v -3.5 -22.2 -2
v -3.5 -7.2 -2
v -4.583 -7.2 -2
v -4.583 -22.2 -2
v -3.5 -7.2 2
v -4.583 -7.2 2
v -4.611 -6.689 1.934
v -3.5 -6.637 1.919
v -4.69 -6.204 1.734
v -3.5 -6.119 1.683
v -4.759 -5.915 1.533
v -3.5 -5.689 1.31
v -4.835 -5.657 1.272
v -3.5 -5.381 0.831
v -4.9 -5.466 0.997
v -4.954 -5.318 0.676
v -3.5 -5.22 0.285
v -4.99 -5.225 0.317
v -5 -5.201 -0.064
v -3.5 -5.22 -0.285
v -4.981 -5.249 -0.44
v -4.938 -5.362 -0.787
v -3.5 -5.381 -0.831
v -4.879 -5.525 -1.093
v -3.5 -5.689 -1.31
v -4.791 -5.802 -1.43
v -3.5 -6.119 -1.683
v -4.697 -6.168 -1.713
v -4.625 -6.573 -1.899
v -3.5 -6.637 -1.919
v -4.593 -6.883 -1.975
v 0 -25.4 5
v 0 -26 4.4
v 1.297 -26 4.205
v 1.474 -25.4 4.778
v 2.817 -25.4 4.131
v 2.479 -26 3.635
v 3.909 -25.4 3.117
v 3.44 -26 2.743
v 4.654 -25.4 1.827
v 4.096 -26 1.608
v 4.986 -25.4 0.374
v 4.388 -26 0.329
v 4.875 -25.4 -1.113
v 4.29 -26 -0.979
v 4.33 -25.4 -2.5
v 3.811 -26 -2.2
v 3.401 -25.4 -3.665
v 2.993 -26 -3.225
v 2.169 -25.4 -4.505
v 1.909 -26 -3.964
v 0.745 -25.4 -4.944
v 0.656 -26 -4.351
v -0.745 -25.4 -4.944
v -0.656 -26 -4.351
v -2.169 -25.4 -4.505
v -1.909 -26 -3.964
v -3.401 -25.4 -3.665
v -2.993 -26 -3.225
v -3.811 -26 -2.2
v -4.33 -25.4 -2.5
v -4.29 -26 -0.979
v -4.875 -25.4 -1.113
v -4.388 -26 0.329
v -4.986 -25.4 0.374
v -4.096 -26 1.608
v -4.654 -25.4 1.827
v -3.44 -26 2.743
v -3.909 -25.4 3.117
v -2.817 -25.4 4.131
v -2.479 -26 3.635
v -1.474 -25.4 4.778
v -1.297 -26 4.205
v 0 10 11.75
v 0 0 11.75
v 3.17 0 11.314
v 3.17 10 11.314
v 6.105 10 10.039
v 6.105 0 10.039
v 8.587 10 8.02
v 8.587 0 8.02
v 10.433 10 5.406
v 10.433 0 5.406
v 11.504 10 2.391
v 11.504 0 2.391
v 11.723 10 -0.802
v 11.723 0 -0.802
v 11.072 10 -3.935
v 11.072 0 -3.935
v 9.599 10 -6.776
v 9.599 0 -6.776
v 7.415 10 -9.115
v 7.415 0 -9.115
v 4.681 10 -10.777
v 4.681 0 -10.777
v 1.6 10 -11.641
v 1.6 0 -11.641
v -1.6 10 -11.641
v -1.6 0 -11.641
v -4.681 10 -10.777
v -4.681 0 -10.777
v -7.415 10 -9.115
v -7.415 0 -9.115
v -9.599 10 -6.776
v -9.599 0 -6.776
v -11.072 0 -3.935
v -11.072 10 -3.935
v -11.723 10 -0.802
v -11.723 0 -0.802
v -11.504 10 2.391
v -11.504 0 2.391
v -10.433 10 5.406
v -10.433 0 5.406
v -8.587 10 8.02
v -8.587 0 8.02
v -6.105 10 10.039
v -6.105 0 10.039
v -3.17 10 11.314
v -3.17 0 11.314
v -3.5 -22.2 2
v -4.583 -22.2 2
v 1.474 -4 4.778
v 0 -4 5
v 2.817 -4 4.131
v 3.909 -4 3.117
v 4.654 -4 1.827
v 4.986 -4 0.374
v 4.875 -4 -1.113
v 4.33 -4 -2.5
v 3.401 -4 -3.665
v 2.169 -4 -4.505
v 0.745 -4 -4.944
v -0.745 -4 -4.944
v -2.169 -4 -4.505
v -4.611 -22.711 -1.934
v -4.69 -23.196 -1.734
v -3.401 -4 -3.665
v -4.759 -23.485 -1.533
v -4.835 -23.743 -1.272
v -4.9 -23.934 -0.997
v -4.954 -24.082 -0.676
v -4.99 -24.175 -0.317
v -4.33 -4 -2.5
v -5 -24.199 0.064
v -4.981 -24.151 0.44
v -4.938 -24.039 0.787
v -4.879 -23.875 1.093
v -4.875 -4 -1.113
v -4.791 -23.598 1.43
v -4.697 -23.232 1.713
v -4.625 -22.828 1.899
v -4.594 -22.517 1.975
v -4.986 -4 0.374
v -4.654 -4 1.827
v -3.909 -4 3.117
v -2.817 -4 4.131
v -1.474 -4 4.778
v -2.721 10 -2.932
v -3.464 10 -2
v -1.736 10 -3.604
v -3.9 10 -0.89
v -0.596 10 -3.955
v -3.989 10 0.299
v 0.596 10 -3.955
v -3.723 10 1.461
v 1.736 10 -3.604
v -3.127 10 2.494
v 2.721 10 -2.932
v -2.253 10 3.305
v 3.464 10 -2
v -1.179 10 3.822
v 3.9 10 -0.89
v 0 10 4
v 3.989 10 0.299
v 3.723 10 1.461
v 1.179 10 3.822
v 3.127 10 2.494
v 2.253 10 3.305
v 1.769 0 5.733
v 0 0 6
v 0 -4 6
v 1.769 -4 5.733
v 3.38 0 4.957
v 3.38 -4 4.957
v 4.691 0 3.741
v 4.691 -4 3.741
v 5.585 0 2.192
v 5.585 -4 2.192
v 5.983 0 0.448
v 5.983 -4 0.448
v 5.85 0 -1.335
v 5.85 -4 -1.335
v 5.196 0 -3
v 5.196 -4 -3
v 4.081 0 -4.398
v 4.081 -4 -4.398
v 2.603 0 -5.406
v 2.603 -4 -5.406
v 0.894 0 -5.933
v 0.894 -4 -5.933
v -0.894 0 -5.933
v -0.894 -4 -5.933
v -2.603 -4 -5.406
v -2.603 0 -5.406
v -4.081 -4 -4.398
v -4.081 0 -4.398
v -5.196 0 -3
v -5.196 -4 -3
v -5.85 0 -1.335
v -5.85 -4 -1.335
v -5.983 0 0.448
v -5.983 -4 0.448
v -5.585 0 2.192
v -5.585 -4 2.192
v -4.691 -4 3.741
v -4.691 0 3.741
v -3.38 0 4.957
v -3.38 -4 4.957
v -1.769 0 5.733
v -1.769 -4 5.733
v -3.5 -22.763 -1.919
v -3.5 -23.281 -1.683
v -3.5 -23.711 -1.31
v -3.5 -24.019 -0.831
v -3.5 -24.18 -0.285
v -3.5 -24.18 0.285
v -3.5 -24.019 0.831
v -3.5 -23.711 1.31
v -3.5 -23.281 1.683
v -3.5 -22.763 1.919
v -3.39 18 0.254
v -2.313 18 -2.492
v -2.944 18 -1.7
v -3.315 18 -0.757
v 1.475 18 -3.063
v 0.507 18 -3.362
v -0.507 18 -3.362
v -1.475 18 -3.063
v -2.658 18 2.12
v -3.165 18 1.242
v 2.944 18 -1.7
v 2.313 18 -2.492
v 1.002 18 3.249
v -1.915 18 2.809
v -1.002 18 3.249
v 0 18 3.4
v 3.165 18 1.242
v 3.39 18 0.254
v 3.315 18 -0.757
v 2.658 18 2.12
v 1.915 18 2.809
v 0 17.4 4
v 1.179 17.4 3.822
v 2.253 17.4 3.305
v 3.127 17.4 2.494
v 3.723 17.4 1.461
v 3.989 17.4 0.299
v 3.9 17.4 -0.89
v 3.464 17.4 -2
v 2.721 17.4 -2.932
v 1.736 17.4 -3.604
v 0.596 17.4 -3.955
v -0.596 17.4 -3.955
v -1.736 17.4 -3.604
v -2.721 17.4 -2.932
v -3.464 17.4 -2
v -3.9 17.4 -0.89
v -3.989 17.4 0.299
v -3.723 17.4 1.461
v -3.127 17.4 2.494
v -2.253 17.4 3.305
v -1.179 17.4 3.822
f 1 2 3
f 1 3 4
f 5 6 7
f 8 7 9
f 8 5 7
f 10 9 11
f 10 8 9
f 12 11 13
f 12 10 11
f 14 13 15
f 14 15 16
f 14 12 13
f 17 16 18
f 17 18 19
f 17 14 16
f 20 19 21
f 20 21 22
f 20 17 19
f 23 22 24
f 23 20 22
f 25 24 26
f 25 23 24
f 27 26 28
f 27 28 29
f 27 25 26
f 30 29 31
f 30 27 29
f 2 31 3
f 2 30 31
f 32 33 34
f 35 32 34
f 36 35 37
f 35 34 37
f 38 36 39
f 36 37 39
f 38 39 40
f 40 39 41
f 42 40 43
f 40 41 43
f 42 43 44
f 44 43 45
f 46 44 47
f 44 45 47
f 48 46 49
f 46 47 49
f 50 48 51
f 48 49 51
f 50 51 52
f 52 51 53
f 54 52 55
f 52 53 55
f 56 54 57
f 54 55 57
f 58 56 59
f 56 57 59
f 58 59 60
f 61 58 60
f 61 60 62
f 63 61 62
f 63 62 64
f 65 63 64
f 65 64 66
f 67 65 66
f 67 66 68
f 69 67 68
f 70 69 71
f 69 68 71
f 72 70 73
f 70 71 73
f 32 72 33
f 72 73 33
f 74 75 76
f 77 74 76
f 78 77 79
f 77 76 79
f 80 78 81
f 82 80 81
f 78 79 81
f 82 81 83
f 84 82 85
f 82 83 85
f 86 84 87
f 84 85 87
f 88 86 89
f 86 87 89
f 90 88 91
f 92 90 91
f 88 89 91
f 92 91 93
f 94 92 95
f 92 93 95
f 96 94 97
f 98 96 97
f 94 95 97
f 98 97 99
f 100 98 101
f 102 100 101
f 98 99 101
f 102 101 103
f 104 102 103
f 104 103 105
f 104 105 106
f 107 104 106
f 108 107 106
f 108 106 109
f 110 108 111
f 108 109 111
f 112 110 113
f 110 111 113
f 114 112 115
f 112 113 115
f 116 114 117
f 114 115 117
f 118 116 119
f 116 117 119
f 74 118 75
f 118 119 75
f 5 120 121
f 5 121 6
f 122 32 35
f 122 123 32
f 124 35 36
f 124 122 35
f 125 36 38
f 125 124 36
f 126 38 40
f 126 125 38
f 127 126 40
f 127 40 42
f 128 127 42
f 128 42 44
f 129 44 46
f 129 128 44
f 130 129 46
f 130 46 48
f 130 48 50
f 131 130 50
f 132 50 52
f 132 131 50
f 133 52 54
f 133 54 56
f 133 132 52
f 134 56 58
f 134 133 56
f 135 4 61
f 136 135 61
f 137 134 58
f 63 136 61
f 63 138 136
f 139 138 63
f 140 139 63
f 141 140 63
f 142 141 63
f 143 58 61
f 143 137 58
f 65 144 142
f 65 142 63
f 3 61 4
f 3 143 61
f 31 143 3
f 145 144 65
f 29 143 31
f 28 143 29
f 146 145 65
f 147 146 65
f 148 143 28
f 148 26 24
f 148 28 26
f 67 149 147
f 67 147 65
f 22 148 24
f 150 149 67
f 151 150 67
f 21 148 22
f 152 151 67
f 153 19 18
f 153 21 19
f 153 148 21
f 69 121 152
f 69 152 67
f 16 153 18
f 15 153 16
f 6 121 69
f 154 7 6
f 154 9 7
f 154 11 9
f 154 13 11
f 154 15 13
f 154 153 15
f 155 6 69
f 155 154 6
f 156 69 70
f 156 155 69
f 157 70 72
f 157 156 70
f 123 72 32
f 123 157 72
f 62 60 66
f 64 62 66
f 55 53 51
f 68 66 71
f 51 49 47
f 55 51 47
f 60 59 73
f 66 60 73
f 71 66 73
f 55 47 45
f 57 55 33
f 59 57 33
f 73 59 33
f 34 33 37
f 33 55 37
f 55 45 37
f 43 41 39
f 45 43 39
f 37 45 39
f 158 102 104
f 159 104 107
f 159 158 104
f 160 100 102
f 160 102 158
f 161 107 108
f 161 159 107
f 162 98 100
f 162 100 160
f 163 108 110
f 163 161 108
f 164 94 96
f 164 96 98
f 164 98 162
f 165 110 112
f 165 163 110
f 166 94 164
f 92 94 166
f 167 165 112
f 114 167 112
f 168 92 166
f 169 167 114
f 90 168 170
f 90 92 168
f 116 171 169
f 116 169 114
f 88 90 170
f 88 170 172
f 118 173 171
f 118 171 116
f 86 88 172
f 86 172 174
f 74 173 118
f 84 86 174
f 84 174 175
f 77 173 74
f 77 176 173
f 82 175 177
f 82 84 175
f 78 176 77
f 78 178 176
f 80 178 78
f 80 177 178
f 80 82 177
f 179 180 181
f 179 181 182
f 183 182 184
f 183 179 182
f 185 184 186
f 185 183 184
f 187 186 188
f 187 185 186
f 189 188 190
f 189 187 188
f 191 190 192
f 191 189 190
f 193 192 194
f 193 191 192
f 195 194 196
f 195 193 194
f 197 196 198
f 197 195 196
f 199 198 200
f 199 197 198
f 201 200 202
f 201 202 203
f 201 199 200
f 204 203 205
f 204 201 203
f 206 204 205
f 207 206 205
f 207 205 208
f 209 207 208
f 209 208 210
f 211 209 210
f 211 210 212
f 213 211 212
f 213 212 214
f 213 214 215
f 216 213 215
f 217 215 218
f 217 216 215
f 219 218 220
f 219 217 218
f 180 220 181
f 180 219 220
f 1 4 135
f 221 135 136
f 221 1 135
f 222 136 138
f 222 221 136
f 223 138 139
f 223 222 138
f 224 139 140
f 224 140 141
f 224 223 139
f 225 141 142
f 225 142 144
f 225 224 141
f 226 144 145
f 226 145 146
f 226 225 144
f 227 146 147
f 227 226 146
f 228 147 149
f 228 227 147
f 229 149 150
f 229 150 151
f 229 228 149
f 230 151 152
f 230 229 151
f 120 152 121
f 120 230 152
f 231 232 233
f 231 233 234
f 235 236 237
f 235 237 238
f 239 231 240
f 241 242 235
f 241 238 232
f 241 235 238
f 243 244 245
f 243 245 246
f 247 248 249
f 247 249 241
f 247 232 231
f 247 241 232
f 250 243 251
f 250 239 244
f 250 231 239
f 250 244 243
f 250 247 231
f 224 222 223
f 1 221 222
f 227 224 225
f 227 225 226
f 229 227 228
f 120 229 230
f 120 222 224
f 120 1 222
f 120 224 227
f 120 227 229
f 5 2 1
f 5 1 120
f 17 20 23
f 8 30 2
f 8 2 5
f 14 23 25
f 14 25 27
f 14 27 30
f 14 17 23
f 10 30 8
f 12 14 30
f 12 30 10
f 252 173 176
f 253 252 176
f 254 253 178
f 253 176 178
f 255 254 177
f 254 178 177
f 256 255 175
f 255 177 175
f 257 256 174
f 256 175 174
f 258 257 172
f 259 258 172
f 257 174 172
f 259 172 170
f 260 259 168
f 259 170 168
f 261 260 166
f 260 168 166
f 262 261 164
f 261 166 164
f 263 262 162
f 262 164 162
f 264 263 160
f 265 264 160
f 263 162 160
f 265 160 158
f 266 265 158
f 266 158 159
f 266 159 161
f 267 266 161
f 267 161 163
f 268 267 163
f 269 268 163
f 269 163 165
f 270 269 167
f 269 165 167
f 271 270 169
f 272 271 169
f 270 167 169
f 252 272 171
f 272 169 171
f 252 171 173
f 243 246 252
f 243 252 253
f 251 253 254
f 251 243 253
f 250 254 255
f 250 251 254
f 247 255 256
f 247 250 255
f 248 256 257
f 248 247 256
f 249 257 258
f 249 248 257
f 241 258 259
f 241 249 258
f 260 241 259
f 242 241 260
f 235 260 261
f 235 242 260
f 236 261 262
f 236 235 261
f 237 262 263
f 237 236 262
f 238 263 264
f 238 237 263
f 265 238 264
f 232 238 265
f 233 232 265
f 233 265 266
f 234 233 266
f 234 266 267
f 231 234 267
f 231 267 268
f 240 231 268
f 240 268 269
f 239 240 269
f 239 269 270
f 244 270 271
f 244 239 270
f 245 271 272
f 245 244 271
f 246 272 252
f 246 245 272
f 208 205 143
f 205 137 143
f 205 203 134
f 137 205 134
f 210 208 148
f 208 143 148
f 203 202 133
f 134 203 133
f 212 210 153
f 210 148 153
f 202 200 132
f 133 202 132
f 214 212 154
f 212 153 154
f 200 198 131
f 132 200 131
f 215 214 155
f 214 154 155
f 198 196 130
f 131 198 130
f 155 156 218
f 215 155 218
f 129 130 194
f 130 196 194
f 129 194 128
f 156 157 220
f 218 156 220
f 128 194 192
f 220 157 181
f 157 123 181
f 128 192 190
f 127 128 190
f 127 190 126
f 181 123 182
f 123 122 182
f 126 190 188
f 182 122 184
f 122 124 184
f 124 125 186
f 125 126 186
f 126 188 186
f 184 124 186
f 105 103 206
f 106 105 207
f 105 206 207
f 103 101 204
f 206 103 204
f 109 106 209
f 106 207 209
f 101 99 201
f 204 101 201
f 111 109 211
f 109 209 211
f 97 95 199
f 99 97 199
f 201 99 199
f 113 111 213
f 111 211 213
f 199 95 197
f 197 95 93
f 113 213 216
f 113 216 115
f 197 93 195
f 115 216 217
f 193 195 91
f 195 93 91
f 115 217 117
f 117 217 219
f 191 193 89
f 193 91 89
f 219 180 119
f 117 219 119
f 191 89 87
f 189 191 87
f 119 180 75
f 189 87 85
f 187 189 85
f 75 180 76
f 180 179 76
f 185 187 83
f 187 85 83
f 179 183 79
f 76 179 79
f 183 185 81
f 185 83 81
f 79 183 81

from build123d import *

# Parameters (mm, degrees)
SKETCH_1_R          = 11.75
EXTRUDE_1_DEPTH     = 10
SKETCH_1_3_R        = 6
EXTRUDE_2_DEPTH     = 4
SKETCH_1_4_R        = 5
EXTRUDE_3_DEPTH     = 26
CHAMFER_1_SIZE      = 0.6
SKETCH_2_R          = 4
EXTRUDE_4_DEPTH     = 8
CHAMFER_2_SIZE      = 0.6
CUT_EXTRUDE_1_DEPTH = 10


with BuildPart() as part:
    # 草图1 → 凸台-拉伸1 (new body)
    with BuildSketch(Plane(origin=(0, 0, 0), x_dir=(1, 0, 0), z_dir=(0, 1, 0))):
        Circle(SKETCH_1_R)
    extrude(amount=EXTRUDE_1_DEPTH)

    # 草图1<3> → 凸台-拉伸2 (add)
    with BuildSketch(Plane(origin=(0, 0, 0), x_dir=(1, 0, 0), z_dir=(0, 1, 0))):
        Circle(SKETCH_1_3_R)
    extrude(amount=-EXTRUDE_2_DEPTH)

    # 草图1<4> → 凸台-拉伸3 (add)
    with BuildSketch(Plane(origin=(0, 0, 0), x_dir=(1, 0, 0), z_dir=(0, 1, 0))):
        Circle(SKETCH_1_4_R)
    extrude(amount=-EXTRUDE_3_DEPTH)

    # 倒角1
    chamfer_1_edges = [part.edges().sort_by_distance(p)[0] for p in [
        (-5, -26, 0),
    ]]
    chamfer(chamfer_1_edges, length=CHAMFER_1_SIZE)

    # 草图2 → 凸台-拉伸4 (add)
    with BuildSketch(Plane(origin=(0, 10, 0), x_dir=(1, 0, 0), z_dir=(0, 1, 0))):
        Circle(SKETCH_2_R)
    extrude(amount=EXTRUDE_4_DEPTH)

    # 倒角2
    chamfer_2_edges = [part.edges().sort_by_distance(p)[0] for p in [
        (-4, 18, 0),
    ]]
    chamfer(chamfer_2_edges, length=CHAMFER_2_SIZE)

    # 草图3 → 切除-拉伸1 (cut)
    with BuildSketch(Plane(origin=(-3.5, 0, 0), x_dir=(0, 0, -1), z_dir=(1, 0, 0))):
        with BuildLine():
            Line((-2, -22.2), (-2, -7.2))
            ThreePointArc((-2, -7.2), (0, -5.2), (2, -7.2))
            Line((2, -7.2), (2, -22.2))
            ThreePointArc((2, -22.2), (0, -24.2), (-2, -22.2))
        make_face()
    extrude(amount=-CUT_EXTRUDE_1_DEPTH, mode=Mode.SUBTRACT)


solid = part.part
